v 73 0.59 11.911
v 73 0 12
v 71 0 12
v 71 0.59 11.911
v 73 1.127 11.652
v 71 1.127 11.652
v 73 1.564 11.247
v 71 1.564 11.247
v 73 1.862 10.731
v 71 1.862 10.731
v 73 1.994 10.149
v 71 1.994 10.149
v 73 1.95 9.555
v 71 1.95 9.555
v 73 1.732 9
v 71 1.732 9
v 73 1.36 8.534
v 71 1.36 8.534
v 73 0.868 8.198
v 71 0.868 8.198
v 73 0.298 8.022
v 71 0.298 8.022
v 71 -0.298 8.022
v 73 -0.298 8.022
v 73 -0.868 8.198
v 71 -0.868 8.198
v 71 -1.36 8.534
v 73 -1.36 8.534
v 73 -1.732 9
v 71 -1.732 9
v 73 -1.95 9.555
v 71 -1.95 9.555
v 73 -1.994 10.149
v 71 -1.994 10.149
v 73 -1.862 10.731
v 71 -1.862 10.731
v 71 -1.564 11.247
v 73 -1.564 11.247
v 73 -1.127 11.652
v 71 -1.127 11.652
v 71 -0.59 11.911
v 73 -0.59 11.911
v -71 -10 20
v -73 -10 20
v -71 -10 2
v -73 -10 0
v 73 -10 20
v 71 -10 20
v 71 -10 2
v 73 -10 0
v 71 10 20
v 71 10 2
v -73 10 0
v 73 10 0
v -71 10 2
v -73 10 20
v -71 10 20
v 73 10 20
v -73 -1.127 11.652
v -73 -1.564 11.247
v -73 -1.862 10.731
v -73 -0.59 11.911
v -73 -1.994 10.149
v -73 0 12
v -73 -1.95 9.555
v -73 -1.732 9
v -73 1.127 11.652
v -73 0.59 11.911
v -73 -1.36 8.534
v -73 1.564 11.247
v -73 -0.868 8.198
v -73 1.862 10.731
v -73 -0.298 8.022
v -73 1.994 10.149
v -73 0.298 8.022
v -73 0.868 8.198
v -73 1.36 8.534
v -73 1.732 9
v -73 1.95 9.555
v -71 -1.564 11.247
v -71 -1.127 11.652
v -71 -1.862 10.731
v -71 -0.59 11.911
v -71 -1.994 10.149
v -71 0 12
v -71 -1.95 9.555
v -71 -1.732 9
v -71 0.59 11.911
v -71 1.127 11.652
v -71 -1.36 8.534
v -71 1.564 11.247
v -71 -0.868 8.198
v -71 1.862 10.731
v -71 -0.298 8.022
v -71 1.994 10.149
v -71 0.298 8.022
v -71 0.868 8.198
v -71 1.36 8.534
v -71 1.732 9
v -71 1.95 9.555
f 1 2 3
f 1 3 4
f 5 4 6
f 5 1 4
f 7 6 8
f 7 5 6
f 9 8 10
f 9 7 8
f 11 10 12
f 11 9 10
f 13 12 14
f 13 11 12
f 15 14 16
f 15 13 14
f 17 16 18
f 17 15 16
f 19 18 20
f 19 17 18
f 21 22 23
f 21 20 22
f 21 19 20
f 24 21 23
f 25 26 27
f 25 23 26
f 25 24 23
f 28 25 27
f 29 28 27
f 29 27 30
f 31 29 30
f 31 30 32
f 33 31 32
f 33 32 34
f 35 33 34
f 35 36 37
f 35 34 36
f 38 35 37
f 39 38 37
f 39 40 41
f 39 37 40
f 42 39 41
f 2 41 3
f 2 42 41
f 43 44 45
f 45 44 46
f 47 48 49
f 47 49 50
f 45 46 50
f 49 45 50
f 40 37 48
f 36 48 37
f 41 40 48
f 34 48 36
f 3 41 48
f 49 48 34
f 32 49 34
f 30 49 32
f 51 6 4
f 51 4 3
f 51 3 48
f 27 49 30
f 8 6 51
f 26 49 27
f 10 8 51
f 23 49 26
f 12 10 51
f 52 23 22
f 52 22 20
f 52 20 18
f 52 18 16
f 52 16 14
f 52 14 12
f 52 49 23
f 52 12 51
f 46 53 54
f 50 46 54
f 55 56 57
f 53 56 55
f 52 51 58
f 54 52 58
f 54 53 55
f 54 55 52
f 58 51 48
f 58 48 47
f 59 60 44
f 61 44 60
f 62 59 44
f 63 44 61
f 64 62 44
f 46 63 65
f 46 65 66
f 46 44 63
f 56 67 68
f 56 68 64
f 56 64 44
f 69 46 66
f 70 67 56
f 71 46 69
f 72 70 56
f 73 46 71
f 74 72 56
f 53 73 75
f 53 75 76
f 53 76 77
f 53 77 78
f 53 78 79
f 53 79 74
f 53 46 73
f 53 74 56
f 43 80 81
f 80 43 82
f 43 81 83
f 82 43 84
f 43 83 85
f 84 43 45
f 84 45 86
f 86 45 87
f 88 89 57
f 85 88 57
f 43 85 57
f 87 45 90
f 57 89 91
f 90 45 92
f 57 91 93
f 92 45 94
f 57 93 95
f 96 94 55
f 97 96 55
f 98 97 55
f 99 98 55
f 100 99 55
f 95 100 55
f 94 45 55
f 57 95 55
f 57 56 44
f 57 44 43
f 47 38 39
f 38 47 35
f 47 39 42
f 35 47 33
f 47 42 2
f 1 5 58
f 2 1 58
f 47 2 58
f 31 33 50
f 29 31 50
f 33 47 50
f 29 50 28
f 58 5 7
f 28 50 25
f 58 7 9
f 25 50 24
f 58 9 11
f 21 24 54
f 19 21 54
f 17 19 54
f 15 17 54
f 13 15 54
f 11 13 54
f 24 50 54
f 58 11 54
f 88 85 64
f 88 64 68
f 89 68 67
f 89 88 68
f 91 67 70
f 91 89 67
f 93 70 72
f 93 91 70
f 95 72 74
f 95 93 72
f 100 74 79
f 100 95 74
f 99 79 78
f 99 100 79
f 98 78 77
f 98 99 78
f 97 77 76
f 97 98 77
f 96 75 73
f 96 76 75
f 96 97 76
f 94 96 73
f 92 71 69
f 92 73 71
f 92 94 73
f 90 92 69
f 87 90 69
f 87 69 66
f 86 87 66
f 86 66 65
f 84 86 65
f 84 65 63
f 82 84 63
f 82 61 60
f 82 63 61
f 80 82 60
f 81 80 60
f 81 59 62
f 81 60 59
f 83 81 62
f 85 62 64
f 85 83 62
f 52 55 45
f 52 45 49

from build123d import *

# Parameters (mm, degrees)
SKETCH1_W               = 146
SKETCH1_H               = 20
BOSS_EXTRUDE1_DEPTH     = 2
SKETCH2_W               = 2
SKETCH2_H               = 20
BOSS_EXTRUDE2_DEPTH     = 18
CUT_EXTRUDE1_DEPTH      = 148.702403501
CUT_EXTRUDE1_DEPTH_BACK = 148.702403501
SKETCH3_R               = 2


with BuildPart() as part:
    # Sketch1 → Boss-Extrude1 (new body)
    with BuildSketch(Plane.XY):
        Rectangle(SKETCH1_W, SKETCH1_H)
    extrude(amount=BOSS_EXTRUDE1_DEPTH)

    # Sketch2 → Boss-Extrude2 (add)
    with BuildSketch(Plane.XY.offset(2)):
        with Locations((72, 0)):
            Rectangle(SKETCH2_W, SKETCH2_H)
        with Locations((-72, 0)):
            Rectangle(SKETCH2_W, SKETCH2_H)
    extrude(amount=BOSS_EXTRUDE2_DEPTH)

    # Sketch3 → Cut-Extrude1 (cut, two sides: drawn at the far end of the back side and taken through both)
    with BuildSketch(Plane.ZY.offset(73).offset(-CUT_EXTRUDE1_DEPTH_BACK)):
        with Locations((10, 0)):
            Circle(SKETCH3_R)
    extrude(amount=CUT_EXTRUDE1_DEPTH + CUT_EXTRUDE1_DEPTH_BACK, mode=Mode.SUBTRACT)


solid = part.part
